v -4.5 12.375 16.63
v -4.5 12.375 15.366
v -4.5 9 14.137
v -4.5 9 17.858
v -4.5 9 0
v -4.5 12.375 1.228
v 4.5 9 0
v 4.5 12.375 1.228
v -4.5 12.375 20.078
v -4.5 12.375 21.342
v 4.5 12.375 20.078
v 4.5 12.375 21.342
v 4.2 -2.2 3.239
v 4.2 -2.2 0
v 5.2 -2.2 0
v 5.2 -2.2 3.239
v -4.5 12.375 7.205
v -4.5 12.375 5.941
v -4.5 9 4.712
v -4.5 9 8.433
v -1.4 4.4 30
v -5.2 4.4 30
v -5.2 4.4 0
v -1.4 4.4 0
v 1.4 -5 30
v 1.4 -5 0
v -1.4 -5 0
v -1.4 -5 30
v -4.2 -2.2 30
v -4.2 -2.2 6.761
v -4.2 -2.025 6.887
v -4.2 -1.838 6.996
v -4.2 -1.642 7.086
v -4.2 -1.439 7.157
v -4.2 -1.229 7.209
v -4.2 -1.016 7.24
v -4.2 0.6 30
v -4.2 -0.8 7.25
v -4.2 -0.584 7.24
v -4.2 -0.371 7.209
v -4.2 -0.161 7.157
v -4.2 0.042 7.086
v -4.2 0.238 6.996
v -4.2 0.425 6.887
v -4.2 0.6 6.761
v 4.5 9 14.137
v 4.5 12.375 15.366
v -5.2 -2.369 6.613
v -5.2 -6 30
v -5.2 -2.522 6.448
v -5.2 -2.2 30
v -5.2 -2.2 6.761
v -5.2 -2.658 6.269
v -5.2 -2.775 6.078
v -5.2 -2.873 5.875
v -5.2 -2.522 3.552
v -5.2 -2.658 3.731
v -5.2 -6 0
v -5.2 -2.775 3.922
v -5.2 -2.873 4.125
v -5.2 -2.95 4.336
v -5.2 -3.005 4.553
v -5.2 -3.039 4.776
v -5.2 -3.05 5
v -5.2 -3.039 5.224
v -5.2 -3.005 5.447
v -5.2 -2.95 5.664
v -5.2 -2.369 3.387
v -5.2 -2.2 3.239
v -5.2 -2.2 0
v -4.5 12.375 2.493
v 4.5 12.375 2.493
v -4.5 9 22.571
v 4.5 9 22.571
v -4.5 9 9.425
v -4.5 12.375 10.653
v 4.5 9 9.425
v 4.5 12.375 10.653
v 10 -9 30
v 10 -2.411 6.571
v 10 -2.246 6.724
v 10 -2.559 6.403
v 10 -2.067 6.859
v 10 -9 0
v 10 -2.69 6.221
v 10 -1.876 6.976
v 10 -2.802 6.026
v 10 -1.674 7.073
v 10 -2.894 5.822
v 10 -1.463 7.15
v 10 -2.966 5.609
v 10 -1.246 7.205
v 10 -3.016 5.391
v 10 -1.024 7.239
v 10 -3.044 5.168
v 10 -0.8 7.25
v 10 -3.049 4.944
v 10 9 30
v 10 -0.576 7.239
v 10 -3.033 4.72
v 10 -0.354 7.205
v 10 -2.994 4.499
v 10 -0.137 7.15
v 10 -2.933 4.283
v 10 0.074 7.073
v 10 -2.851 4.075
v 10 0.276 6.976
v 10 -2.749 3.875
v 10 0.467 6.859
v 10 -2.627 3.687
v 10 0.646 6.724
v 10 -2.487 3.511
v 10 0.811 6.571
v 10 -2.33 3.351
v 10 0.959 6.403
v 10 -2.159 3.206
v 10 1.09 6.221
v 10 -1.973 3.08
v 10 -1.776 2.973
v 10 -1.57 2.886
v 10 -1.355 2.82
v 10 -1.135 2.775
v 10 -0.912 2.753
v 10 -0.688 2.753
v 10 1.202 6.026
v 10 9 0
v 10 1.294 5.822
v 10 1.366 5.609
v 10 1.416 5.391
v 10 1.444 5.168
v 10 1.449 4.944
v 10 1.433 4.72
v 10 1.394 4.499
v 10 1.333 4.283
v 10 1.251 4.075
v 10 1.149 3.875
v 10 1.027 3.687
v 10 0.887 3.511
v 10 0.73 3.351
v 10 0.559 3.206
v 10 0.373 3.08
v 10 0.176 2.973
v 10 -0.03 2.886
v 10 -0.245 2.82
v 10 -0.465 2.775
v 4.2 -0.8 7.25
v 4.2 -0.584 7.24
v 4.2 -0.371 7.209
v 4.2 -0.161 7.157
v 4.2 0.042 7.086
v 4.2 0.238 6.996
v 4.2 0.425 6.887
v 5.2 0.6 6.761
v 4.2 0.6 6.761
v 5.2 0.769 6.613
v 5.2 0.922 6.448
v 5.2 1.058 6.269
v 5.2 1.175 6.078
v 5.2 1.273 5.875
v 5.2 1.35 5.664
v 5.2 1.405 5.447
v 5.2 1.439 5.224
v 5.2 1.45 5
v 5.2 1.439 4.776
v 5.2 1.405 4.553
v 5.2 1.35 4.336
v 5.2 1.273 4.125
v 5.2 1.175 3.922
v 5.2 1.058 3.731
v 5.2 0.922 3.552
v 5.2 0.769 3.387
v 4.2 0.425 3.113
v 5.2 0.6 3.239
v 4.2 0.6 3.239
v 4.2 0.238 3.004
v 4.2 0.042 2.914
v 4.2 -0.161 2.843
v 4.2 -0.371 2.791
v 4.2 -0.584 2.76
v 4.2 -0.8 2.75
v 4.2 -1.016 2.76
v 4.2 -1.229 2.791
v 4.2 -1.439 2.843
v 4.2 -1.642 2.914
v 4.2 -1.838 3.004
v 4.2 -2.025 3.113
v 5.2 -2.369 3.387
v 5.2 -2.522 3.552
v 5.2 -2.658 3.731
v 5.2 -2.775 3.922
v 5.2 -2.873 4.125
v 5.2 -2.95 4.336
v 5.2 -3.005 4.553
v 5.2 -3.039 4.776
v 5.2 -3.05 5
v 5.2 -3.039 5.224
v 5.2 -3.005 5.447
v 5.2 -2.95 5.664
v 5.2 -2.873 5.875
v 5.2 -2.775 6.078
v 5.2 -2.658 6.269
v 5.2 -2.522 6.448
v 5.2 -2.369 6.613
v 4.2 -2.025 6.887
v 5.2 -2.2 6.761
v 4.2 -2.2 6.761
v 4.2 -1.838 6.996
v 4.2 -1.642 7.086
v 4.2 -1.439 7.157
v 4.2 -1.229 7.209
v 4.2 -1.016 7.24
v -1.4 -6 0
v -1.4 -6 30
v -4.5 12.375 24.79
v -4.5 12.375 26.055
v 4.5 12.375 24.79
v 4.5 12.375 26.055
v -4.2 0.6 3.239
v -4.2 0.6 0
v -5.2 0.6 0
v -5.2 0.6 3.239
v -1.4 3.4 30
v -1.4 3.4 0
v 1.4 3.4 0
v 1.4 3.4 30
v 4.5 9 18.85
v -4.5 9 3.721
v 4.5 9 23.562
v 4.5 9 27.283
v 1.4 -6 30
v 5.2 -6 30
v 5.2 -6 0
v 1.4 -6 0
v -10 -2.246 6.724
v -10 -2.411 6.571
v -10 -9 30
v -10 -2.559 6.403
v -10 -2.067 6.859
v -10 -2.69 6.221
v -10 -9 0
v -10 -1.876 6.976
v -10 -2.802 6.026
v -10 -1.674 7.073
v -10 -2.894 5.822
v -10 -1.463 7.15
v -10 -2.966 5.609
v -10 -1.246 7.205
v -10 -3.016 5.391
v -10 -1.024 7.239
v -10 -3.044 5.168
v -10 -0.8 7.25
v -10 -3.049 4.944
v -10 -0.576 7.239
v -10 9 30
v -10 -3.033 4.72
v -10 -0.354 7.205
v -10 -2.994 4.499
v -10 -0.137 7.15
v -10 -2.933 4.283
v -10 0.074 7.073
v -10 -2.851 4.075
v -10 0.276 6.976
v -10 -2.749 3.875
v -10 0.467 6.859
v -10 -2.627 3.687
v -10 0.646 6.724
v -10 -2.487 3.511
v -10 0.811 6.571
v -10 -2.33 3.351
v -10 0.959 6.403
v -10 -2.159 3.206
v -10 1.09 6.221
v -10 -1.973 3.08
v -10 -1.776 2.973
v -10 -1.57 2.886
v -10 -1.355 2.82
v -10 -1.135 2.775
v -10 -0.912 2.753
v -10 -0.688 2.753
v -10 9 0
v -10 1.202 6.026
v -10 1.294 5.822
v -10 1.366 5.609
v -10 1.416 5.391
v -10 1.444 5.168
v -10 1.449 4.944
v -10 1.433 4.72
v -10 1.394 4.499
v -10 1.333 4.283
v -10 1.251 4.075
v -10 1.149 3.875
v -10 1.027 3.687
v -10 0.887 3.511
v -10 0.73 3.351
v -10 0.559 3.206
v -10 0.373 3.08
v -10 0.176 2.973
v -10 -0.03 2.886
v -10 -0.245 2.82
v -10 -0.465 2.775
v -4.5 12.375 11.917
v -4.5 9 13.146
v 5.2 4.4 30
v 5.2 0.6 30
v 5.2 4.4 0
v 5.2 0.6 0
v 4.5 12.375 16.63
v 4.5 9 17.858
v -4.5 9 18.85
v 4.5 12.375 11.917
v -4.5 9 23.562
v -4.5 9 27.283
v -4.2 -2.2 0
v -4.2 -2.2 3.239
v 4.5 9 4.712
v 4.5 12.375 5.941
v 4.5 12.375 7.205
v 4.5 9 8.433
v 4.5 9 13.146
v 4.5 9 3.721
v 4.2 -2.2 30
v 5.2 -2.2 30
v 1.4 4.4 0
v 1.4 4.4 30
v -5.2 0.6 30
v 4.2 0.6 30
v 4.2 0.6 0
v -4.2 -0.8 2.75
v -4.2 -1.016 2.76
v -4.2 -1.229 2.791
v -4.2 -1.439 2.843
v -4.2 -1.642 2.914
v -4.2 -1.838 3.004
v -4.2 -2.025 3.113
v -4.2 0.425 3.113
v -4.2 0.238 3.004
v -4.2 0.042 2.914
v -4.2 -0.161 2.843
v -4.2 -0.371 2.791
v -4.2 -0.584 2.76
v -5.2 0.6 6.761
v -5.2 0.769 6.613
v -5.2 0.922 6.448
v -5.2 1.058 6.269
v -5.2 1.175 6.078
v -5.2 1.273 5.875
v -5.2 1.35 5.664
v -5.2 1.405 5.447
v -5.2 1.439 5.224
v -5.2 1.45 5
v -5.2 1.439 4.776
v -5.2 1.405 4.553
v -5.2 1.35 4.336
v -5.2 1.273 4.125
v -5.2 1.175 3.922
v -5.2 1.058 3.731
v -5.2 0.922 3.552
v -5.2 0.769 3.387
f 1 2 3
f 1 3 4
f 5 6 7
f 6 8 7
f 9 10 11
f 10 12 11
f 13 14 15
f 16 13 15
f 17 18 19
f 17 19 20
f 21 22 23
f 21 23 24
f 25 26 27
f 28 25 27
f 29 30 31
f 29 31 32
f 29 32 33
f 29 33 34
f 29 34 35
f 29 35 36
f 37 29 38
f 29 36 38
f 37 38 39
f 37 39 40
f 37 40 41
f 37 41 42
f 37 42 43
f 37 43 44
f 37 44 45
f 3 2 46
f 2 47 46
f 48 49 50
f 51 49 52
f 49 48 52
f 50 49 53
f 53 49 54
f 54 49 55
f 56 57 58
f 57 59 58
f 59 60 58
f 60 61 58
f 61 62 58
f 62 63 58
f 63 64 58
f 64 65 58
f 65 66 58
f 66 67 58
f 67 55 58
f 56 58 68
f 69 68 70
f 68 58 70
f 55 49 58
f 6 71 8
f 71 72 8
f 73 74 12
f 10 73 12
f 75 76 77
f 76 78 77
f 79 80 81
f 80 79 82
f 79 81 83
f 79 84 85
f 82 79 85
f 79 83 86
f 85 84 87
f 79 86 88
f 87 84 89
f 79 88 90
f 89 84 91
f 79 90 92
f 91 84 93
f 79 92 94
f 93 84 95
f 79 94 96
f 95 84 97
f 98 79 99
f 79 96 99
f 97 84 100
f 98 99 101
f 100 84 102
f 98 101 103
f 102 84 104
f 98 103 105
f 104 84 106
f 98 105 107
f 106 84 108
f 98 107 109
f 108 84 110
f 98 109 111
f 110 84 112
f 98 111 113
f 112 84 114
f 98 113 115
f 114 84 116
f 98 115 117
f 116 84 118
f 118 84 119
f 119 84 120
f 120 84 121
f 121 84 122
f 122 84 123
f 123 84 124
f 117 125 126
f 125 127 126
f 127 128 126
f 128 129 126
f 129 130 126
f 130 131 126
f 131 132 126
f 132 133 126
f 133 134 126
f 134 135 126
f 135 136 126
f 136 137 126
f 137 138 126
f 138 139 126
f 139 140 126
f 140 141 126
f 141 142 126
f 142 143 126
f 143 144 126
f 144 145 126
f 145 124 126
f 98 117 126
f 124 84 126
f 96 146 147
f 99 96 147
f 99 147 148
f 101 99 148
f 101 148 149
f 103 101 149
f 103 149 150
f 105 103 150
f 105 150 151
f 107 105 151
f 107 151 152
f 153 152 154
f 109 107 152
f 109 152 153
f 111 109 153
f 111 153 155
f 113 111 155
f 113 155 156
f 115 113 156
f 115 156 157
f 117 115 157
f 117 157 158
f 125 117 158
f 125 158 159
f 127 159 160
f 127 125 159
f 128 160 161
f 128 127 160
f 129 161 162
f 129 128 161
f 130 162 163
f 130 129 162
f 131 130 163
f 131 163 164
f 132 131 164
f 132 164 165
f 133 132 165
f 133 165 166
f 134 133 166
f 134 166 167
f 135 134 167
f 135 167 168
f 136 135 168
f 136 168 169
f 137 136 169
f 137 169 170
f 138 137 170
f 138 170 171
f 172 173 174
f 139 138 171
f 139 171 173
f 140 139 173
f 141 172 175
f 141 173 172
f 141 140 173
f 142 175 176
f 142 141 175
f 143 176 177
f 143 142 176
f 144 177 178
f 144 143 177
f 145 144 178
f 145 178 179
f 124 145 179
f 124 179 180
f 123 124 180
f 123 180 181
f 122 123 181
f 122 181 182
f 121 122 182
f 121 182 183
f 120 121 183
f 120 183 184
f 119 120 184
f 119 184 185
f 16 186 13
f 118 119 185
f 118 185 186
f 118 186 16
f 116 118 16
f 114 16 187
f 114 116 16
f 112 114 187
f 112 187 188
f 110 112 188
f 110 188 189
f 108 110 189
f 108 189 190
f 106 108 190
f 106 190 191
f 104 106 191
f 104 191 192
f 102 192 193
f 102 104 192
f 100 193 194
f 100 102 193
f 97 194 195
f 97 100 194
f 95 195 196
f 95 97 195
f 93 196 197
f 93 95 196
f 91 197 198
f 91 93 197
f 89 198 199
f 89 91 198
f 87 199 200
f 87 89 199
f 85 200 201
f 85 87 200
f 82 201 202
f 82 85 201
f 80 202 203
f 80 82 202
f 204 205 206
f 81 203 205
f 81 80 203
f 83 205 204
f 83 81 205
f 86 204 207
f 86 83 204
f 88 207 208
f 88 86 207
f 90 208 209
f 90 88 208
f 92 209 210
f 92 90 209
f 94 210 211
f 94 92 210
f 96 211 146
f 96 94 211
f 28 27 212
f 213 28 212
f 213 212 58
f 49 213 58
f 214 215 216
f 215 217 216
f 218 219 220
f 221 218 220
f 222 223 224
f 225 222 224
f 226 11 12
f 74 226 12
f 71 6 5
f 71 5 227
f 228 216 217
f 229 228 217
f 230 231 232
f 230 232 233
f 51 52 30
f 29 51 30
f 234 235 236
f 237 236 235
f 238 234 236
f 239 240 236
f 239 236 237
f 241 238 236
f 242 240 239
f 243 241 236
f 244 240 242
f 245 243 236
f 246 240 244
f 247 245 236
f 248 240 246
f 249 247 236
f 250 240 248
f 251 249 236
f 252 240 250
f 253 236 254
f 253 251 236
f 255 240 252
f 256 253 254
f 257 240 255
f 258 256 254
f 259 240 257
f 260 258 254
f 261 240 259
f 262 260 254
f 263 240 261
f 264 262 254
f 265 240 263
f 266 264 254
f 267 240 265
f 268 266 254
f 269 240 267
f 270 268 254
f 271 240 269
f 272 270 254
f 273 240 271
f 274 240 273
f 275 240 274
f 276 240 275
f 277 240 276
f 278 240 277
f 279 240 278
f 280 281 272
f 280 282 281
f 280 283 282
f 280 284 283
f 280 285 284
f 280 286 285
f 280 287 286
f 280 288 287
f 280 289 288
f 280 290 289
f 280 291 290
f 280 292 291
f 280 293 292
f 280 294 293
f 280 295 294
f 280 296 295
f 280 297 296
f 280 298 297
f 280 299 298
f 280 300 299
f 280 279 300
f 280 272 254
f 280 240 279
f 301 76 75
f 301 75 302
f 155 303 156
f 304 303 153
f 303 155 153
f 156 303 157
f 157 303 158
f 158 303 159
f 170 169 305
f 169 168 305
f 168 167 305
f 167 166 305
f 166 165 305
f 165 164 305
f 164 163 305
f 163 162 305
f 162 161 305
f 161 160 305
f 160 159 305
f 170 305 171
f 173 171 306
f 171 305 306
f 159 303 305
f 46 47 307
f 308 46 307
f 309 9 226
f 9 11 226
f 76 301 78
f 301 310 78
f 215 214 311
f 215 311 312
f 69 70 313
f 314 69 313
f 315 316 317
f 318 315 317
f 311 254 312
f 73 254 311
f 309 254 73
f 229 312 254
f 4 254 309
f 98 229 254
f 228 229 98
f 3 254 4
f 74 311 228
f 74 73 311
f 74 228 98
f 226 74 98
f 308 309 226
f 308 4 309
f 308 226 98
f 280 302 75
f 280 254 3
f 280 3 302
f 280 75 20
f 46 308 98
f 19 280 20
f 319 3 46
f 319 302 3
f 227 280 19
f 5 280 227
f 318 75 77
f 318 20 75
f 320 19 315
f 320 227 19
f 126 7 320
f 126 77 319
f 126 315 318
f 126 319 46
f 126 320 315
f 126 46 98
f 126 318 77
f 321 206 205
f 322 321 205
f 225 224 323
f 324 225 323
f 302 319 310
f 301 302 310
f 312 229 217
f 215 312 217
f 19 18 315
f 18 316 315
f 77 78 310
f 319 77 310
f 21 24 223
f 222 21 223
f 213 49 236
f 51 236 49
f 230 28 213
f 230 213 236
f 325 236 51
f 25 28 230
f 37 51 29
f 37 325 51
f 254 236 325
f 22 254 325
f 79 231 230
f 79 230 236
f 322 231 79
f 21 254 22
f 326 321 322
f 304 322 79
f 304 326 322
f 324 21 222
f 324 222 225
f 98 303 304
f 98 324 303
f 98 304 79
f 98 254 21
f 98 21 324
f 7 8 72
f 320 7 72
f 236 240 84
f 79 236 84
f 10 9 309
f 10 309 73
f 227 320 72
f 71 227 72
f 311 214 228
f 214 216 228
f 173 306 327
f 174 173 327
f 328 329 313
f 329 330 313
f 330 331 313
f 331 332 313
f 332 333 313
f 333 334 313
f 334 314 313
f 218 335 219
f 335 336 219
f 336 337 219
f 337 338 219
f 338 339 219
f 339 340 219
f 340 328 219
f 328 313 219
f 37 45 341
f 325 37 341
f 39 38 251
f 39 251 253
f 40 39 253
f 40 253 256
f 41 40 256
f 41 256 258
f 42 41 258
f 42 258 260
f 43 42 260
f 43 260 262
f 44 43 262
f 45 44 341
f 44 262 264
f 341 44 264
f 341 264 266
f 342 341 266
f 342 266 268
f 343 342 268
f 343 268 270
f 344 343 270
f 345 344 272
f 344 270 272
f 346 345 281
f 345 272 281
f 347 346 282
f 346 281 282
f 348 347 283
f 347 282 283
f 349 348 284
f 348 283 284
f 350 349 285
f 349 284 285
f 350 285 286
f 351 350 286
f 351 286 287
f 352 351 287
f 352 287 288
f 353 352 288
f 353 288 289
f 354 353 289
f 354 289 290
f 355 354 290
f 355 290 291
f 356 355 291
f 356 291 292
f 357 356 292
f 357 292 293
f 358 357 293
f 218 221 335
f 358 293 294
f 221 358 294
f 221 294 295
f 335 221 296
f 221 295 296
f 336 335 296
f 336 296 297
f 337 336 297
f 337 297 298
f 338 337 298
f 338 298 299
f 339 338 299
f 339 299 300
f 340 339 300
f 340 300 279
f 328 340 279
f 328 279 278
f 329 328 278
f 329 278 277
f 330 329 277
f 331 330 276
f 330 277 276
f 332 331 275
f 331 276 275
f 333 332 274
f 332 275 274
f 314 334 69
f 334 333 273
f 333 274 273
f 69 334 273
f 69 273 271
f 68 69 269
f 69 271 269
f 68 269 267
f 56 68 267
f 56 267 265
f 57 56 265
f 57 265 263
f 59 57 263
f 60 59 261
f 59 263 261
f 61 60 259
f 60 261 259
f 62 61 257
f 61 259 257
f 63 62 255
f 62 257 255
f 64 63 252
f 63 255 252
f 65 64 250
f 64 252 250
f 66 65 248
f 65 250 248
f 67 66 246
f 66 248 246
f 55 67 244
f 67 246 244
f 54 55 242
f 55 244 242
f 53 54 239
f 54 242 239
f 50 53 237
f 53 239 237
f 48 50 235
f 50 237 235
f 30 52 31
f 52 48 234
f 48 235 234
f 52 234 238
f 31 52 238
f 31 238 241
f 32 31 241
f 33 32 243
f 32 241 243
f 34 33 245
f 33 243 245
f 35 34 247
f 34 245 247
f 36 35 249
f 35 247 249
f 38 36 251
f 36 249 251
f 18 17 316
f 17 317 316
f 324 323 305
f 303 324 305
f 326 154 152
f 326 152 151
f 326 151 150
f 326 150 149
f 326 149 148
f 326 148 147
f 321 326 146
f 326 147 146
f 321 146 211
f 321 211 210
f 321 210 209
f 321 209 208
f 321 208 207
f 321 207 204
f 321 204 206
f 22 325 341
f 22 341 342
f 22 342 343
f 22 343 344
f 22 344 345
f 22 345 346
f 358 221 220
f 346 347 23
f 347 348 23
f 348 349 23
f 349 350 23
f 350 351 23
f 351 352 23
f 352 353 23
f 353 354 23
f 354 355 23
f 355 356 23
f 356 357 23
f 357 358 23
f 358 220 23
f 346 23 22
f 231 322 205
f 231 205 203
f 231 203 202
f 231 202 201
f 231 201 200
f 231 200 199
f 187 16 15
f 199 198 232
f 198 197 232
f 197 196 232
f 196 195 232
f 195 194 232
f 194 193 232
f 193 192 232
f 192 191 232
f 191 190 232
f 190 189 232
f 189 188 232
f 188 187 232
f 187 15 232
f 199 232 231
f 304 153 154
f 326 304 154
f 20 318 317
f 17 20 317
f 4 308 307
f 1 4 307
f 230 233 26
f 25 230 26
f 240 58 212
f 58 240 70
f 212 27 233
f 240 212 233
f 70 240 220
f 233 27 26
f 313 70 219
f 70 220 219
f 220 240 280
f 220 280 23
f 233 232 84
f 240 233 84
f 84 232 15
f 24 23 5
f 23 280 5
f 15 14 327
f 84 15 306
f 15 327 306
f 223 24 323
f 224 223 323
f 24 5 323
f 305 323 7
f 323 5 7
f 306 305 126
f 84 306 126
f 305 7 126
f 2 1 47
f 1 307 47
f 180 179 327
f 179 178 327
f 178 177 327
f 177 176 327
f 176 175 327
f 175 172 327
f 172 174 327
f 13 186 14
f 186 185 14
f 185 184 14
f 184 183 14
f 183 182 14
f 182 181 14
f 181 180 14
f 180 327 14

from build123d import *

# Parameters (mm, degrees)
ESQUISSE1_W                = 20
ESQUISSE1_H                = 18
MAIN_EXTRUSION_DEPTH       = 30
MAIN_RIDING_HOLE_DEPTH     = 31
ESQUISSE4_R                = 2.25
TRACTORHOLE_DEPTH          = 8
BOSS_EXTRU_1_DEPTH         = 4.5
R_P_TITION_LIN_AIRE1_COUNT = 6
R_P_TITION_LIN_AIRE1_PITCH = 4.71238898


with BuildPart() as part:
    # Esquisse1 → Main Extrusion (new body)
    with BuildSketch(Plane.XY):
        Rectangle(ESQUISSE1_W, ESQUISSE1_H)
    extrude(amount=MAIN_EXTRUSION_DEPTH)

    # Esquisse3 → Main Riding Hole (cut, through all)
    with BuildSketch(Plane(origin=(0, 0, 0), x_dir=(-1, 0, 0), z_dir=(0, 0, -1))):
        Polygon((-5.2, 4.4), (-5.2, 0.6), (-4.2, 0.6), (-4.2, -2.2), (-5.2, -2.2), (-5.2, -6), (-1.4, -6), (-1.4, -5), (1.4, -5), (1.4, -6), (5.2, -6), (5.2, -2.2), (4.2, -2.2), (4.2, 0.6), (5.2, 0.6), (5.2, 4.4), (1.4, 4.4), (1.4, 3.4), (-1.4, 3.4), (-1.4, 4.4), align=None)
    extrude(amount=-MAIN_RIDING_HOLE_DEPTH, mode=Mode.SUBTRACT)

    # Esquisse4 → TractorHole (cut)
    with BuildSketch(Plane.ZY.offset(10)):
        with Locations((5, -0.8)):
            Circle(ESQUISSE4_R)
    tractorhole = extrude(amount=-TRACTORHOLE_DEPTH, mode=Mode.SUBTRACT)

    # TractorHoleSymetry: TractorHole across plane
    add(tractorhole.mirror(Plane(origin=(0, 0, 0), x_dir=(0, 0, 1), z_dir=(1, 0, 0))), mode=Mode.SUBTRACT)

    # Esquisse8 → Boss.-Extru.1 (add, symmetric)
    with BuildSketch(Plane(origin=(0, 0, 0), x_dir=(0, 0, -1), z_dir=(1, 0, 0))):
        Polygon((-3.721082869, 9), (-2.492683328, 12.375), (-1.228399541, 12.375), (0, 9), align=None)
    boss_extru_1 = extrude(amount=BOSS_EXTRU_1_DEPTH, both=True)

    # Répétition linéaire1: Boss.-Extru.1 ×6
    with Locations(*[(0, 0, i * R_P_TITION_LIN_AIRE1_PITCH) for i in range(1, R_P_TITION_LIN_AIRE1_COUNT)]):
        add(boss_extru_1)


solid = part.part
